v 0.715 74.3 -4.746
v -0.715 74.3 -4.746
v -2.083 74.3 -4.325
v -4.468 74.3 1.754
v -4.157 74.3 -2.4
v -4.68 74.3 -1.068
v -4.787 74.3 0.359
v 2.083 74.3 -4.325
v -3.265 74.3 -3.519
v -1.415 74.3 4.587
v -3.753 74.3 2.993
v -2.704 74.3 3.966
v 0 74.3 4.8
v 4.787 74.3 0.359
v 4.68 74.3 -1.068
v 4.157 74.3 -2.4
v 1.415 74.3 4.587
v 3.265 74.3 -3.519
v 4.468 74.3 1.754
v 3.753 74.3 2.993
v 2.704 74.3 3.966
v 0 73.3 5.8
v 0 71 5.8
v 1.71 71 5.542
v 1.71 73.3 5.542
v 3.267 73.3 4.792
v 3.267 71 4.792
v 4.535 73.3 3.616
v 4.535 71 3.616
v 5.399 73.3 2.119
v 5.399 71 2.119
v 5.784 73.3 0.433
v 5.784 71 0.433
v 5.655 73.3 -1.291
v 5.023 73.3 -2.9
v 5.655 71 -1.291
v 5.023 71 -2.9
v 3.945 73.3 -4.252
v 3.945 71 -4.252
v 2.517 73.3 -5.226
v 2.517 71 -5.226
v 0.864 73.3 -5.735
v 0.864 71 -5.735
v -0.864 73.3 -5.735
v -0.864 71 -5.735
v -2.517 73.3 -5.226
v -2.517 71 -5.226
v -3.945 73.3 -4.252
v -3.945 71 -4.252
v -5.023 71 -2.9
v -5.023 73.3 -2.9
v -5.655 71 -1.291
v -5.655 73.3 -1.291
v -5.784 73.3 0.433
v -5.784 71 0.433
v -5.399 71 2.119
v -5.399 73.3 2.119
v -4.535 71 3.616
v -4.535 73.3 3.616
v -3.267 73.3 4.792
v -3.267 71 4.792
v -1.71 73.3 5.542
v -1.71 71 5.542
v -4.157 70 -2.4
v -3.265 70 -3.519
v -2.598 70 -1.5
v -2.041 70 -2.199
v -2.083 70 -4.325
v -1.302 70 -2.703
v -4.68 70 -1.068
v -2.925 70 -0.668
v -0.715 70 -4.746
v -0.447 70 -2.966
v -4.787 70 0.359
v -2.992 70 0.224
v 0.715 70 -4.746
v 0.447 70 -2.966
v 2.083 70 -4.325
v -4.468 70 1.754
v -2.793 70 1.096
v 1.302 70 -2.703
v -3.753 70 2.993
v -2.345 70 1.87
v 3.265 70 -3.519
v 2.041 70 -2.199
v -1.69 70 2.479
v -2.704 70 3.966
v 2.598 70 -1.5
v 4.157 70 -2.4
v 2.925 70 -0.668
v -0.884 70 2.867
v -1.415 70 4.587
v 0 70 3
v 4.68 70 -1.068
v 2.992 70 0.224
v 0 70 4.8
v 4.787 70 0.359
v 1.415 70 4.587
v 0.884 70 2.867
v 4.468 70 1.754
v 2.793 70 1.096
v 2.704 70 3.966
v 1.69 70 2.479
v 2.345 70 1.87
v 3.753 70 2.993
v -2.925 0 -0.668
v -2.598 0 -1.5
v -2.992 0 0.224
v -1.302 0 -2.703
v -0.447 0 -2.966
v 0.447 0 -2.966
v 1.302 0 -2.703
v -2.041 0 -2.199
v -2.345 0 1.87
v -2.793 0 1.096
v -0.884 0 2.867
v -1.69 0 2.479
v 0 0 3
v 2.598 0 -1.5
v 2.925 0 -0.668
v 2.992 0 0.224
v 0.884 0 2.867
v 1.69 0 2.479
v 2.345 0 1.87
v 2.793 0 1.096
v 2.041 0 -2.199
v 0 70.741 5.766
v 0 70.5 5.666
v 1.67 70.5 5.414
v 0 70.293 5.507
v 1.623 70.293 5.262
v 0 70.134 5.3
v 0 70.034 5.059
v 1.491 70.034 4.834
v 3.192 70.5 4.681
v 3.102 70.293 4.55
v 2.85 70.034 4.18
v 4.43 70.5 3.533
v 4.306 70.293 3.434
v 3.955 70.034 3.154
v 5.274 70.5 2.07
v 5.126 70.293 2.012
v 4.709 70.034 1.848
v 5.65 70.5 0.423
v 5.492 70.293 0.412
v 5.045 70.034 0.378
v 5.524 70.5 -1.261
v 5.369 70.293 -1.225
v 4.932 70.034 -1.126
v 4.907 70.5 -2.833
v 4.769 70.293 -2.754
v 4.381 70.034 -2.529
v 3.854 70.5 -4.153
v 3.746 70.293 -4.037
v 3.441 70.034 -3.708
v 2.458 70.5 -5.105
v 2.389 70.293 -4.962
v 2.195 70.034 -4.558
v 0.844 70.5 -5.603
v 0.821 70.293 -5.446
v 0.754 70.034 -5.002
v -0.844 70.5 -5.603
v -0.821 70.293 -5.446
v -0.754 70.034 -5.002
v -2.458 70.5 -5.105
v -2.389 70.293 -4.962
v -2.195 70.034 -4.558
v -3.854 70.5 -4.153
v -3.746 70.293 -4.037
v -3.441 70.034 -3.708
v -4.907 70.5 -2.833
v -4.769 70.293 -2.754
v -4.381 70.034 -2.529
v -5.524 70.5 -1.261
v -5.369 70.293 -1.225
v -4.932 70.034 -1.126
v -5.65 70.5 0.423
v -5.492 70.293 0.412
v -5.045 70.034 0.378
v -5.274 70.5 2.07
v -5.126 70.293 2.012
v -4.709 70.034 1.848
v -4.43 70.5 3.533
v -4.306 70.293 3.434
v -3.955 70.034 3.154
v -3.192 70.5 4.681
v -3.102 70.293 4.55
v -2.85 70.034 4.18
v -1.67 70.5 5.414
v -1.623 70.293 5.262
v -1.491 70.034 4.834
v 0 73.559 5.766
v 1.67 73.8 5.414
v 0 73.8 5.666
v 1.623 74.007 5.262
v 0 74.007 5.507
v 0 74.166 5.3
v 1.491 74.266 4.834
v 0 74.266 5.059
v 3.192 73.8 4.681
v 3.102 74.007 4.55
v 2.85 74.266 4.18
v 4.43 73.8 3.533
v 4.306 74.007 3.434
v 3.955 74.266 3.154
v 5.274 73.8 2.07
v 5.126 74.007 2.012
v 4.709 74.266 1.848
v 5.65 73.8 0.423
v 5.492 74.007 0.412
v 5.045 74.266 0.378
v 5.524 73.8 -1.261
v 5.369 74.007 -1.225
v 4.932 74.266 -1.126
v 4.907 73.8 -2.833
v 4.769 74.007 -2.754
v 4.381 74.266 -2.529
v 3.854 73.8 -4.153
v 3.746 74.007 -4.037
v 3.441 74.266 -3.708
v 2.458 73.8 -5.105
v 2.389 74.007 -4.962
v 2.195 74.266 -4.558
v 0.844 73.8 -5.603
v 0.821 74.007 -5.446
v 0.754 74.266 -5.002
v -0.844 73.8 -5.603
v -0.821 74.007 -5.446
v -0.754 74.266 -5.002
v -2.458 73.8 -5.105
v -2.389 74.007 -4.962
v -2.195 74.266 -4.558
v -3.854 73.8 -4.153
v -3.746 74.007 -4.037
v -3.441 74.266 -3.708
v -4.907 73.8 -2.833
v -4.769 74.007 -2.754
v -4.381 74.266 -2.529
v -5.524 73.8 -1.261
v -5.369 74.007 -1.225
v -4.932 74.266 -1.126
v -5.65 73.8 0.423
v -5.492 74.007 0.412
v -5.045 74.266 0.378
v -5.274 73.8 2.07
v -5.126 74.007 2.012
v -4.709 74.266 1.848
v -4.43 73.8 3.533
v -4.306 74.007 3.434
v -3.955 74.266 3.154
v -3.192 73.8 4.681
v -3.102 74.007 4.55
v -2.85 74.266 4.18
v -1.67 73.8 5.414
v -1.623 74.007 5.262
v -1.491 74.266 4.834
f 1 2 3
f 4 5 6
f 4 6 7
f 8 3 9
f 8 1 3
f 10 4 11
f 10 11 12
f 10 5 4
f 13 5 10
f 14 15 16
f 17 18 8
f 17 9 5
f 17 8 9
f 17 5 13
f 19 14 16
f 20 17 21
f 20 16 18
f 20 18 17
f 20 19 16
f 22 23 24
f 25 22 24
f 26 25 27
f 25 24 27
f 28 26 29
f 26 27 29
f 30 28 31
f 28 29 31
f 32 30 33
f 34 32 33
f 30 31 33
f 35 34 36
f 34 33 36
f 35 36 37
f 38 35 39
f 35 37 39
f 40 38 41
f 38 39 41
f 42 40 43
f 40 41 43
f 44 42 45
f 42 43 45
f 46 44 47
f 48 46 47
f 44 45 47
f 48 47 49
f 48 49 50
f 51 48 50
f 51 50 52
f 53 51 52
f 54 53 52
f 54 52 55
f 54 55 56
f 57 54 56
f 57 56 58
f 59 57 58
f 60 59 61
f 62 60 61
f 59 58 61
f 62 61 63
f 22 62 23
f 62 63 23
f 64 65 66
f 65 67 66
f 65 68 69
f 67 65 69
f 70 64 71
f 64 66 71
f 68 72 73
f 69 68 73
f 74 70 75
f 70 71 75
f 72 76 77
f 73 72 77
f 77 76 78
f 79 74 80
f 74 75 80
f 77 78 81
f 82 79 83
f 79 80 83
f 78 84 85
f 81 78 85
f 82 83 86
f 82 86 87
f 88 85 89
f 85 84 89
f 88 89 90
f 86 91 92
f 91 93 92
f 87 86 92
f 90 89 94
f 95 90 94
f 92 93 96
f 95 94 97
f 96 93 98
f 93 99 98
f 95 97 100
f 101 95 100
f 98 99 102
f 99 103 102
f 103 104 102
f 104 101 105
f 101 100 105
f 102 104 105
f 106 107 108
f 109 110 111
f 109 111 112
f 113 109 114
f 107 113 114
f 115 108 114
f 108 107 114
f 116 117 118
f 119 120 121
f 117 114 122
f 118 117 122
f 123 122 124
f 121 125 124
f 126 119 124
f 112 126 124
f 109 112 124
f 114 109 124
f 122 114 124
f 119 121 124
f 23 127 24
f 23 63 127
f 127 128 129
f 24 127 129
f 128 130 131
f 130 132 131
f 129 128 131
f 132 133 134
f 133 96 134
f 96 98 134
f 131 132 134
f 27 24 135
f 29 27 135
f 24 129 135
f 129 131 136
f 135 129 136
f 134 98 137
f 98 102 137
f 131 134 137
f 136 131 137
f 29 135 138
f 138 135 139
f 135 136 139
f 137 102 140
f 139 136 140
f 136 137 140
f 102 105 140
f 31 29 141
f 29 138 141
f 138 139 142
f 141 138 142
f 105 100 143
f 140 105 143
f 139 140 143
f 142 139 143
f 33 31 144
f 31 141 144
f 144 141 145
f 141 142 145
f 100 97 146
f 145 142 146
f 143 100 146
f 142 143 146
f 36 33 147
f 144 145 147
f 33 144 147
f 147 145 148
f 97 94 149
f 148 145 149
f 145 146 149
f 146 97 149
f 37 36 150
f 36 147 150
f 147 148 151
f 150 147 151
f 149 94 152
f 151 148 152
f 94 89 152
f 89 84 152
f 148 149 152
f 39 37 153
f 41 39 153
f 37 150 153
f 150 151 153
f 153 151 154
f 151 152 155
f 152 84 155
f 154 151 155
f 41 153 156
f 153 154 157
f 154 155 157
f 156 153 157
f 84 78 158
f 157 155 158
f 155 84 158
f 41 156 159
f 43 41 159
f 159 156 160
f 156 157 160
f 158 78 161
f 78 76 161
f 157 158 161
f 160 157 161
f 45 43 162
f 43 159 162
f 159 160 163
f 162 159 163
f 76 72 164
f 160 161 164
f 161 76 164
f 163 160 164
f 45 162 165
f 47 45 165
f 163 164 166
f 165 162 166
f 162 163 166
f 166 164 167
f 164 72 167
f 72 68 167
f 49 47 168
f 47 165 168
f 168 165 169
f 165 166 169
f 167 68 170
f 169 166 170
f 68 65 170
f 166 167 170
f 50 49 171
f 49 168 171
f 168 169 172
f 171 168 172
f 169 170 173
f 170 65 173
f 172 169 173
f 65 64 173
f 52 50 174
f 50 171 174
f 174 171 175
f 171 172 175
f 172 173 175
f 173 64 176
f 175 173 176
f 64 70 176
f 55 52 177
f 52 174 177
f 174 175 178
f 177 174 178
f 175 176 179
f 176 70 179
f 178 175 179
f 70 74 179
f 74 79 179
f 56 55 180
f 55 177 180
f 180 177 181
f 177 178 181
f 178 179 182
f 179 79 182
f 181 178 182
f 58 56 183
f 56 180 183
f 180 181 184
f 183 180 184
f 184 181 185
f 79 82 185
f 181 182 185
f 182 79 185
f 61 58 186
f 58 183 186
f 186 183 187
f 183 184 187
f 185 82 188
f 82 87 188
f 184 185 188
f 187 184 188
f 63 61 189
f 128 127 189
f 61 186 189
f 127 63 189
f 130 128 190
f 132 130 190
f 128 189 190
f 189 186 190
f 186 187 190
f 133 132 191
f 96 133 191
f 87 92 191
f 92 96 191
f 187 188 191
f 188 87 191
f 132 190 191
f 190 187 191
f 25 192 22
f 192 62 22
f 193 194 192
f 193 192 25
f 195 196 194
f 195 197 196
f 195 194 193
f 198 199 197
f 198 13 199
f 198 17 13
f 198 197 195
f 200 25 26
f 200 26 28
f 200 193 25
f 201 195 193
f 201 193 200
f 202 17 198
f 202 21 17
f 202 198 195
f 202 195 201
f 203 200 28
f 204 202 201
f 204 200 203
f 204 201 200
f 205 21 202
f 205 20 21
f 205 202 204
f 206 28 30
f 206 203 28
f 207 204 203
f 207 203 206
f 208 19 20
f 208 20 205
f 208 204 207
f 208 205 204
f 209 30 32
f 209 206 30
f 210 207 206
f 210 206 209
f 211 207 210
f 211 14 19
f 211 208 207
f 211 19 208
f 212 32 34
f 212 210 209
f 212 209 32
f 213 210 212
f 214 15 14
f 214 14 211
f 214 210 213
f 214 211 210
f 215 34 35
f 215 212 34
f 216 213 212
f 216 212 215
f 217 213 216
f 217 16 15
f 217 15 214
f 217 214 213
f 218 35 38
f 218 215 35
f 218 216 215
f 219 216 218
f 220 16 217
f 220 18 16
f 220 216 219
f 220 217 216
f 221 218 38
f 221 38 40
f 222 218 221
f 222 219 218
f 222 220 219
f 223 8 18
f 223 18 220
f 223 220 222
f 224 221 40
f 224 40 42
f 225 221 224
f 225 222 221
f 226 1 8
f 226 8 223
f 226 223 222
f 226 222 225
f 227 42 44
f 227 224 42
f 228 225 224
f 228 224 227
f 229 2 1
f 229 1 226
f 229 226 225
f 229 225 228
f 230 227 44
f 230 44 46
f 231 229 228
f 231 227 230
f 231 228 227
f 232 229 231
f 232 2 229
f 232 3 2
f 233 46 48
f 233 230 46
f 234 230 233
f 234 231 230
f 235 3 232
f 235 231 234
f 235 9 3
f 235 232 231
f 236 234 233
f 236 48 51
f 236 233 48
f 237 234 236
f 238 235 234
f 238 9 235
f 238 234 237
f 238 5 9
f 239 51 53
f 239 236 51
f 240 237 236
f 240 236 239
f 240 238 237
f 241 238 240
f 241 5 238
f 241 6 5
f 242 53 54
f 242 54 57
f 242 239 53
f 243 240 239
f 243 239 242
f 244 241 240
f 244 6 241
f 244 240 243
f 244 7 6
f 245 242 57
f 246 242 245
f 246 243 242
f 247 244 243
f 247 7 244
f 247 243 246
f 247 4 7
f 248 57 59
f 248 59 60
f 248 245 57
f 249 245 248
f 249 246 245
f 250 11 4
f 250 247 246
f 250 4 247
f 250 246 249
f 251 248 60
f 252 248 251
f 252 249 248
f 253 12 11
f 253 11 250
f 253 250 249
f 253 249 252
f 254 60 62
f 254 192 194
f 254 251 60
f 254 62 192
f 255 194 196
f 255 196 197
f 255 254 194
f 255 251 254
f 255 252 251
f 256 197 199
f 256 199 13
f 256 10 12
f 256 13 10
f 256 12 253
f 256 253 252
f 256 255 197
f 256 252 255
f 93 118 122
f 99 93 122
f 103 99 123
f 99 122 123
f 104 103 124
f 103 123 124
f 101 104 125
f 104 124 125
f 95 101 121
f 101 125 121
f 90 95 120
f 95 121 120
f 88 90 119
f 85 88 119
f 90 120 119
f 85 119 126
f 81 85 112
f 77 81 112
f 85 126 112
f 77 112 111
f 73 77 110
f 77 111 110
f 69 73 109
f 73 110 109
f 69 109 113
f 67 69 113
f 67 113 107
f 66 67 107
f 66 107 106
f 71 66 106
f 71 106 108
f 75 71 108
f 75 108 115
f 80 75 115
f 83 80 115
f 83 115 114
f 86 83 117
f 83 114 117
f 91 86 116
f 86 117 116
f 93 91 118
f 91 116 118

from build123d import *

# Parameters (mm, degrees)
SKETCH1_R           = 3
BOSS_EXTRUDE1_DEPTH = 70
SKETCH2_R           = 5.8
BOSS_EXTRUDE2_DEPTH = 4.3
FILLET1_R           = 1


with BuildPart() as part:
    # Sketch1 → Boss-Extrude1 (new body)
    with BuildSketch(Plane(origin=(0, 0, 0), x_dir=(1, 0, 0), z_dir=(0, 1, 0))):
        with Locations(Location((0, 0, 0), (0, 0, 270))):  # turned: the seam where the file's is
            Circle(SKETCH1_R)
    extrude(amount=BOSS_EXTRUDE1_DEPTH)

    # Sketch2 → Boss-Extrude2 (add)
    with BuildSketch(Plane(origin=(0, 70, 0), x_dir=(1, 0, 0), z_dir=(0, 1, 0))):
        with Locations(Location((0, 0, 0), (0, 0, 270))):  # turned: the seam where the file's is
            Circle(SKETCH2_R)
    extrude(amount=BOSS_EXTRUDE2_DEPTH)

    # Fillet1
    fillet1_edges = [part.edges().sort_by_distance(p)[0] for p in [
        (0, 70, -5.8),
        (0, 74.3, -5.8),
    ]]
    fillet(fillet1_edges, radius=FILLET1_R)


solid = part.part
